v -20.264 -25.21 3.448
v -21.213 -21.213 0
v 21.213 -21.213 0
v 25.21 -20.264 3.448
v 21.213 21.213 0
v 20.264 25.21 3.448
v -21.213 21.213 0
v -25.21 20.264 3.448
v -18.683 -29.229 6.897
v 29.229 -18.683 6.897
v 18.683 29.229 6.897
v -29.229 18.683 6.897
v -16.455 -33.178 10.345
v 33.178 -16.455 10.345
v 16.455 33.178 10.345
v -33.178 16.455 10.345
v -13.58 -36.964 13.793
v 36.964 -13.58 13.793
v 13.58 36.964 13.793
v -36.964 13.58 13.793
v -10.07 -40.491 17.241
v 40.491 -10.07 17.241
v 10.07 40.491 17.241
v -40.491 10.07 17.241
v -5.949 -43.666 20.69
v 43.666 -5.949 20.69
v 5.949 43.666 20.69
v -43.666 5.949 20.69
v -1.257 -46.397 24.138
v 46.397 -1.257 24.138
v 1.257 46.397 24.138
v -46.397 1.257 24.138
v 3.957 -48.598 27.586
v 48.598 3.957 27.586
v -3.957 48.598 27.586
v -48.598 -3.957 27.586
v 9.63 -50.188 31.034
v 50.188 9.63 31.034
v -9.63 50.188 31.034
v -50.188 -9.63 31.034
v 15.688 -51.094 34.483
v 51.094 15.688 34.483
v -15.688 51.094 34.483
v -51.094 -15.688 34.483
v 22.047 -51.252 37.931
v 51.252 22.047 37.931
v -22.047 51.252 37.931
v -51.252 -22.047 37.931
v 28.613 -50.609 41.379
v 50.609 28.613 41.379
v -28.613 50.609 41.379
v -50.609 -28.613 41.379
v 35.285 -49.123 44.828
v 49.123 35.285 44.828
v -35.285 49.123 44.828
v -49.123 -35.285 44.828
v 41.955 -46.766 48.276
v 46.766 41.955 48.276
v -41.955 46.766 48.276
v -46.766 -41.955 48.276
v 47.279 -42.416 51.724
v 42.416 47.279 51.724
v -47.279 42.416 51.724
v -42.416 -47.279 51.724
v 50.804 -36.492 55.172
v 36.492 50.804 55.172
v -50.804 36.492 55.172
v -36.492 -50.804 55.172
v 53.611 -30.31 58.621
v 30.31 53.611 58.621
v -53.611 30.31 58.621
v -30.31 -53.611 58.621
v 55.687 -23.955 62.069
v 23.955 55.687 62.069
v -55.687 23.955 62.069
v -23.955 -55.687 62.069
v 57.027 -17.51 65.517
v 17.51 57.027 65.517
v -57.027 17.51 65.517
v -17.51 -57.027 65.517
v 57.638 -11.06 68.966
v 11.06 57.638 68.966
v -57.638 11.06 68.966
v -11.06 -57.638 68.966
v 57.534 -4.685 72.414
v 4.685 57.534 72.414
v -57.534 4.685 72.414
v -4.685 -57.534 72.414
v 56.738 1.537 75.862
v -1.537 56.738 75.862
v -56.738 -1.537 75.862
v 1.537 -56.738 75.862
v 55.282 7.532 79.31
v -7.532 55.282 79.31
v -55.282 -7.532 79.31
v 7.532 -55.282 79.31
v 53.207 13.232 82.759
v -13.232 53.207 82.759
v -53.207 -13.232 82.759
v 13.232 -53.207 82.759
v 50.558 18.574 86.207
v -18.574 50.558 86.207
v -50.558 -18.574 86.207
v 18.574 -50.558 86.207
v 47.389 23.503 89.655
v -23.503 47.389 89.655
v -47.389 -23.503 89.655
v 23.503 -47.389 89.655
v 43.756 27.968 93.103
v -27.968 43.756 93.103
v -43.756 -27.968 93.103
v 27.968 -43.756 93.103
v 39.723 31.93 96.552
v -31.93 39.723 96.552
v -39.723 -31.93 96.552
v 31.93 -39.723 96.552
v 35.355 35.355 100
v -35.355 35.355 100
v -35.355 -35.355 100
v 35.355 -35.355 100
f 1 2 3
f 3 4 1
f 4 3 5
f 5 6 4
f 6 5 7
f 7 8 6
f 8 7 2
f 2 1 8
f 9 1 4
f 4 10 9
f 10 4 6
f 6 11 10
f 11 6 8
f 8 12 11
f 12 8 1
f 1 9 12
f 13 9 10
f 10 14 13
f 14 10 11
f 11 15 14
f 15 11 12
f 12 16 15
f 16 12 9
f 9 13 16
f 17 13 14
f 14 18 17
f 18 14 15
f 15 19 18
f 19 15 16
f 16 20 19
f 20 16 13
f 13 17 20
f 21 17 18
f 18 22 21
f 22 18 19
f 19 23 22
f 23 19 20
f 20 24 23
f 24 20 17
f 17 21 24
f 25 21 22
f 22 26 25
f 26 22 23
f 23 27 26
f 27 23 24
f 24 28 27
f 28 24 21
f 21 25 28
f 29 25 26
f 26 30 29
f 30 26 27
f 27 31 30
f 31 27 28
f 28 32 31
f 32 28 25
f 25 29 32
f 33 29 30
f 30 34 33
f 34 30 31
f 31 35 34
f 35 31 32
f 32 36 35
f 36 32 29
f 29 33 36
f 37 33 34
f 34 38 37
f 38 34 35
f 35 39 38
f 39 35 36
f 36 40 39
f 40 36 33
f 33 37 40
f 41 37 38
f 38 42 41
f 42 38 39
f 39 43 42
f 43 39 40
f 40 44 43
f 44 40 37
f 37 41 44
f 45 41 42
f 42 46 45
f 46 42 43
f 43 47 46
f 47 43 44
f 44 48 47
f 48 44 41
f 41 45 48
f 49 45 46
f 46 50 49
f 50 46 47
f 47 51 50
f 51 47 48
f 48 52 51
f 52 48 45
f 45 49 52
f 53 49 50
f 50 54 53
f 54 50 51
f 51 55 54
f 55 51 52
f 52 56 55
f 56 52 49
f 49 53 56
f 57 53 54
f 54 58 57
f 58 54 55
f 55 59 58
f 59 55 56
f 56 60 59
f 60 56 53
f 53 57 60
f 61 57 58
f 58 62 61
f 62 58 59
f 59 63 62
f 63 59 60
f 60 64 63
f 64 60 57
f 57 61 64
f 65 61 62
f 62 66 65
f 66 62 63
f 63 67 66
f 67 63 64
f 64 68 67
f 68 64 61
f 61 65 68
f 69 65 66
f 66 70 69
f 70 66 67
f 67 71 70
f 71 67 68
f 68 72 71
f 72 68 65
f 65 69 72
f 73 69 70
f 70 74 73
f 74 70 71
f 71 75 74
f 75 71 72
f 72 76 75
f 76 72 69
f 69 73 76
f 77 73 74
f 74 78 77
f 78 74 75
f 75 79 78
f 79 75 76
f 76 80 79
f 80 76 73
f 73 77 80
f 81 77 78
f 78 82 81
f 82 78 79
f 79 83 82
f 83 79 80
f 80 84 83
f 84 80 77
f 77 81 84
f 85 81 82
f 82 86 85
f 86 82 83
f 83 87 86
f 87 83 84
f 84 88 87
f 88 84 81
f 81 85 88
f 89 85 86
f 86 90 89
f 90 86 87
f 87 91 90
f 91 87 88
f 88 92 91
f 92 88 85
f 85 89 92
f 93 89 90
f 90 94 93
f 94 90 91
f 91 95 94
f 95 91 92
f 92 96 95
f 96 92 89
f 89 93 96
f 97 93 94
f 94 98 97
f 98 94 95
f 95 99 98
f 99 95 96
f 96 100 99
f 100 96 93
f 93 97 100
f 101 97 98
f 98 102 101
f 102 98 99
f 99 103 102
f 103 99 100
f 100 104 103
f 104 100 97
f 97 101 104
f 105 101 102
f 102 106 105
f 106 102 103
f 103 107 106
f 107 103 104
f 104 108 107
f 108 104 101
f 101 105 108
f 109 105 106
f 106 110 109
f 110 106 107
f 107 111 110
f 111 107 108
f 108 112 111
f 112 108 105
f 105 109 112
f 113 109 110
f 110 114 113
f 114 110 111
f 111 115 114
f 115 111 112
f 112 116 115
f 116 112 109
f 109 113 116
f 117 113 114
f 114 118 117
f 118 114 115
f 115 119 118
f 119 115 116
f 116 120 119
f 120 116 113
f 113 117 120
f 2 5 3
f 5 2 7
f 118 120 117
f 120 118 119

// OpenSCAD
use <tubemesh.scad>

//<params>

// The vase profile will range from the left edge of the drawing square (=center of vase) to the right side of the drawing.
rightHandProfile = [ [ [-35,-25],[-18,0],[-25,25] ], [[0,1,2]] ]; // [draw_polygon:100x100]
crossSection = [ [ [-25,-25], [25,-25], [25,25], [-25,25] ], [[0,1,2,3]] ]; // [draw_polygon:100x100]
twistAngle = 180;
numberOfSections = 30;
actualHeight = 100;
forceDegreesOfRotationalSymmetry = 1;
mirrorInXAxis = 0; //[0:No,1:Yes]
//</params>

function findLowestY(path,pos=0,lowest=[-1,1e50]) =
    pos >= len(path) ? lowest :
    findLowestY(path,
        pos=pos+1,
        lowest=path[pos][1]<lowest[1] ? [pos,path[pos][1]] :       lowest);
        
// right-most curve from rightHandProfile
profile = [for (i=rightHandProfile[1][0]) rightHandProfile[0][i]];
np = len(profile);
lowest = findLowestY(profile);
lowestIndex = lowest[0];
lowestY = lowest[1];
highest = findLowestY(-profile);
highestIndex = highest[0];
highestY = -highest[1];

function angle(a,b) = let(ab=b-a) atan2(ab[1],ab[0]);

nextAngle = angle(profile[lowestIndex], profile[(lowestIndex+1+np)%np]);
prevAngle = angle(profile[lowestIndex], profile[(lowestIndex-1+np)%np]);
direction = nextAngle<prevAngle ? 1 : -1;

pointsInverted = direction > 0 ? 
    let(adjHighestIndex = lowestIndex <= highestIndex ? highestIndex : highestIndex+np) [for(i=[lowestIndex:adjHighestIndex]) [profile[i%np][1],50+profile[i%np][0]]] :
    let(adjLowestIndex = highestIndex <= lowestIndex ? lowestIndex : lowestIndex+np,
    n = lowestIndex-highestIndex)
    [for(i=[0:n]) let(ii=lowestIndex-i) [profile[ii%np][1],50+profile[ii%np][0]]];

function findSegment(f,x,soFar=0) =
    soFar >= len(f) ? len(f)-1 :
    x <= f[soFar][0] ? max(0,soFar-1) :
    findSegment(f,x,soFar=soFar+1);

function interpolateFunction(f,x) =
    let(i=findSegment(f,x))
    (f[i+1][1]-f[i][1])/(f[i+1][0]-f[i][0])*(x-f[i][0])+f[i][1];

renorm = 1/max([for(c=crossSection[0]) norm(c)]); 

module main(yMultiply=1) {
    for (crossIndices=crossSection[1]) {
        cross = [for(i=crossIndices) [crossSection[0][i][0],crossSection[0][i][1]*yMultiply]];
        sections = [for (i=[0:numberOfSections-1]) 
                let(t=i/(numberOfSections-1),
                    z=lowestY*(1-t)+highestY*t,
                    scale=renorm*interpolateFunction(pointsInverted,z))
                    twistSectionXY(sectionZ(scale*cross,z),t*twistAngle)];
        scale(actualHeight/(highestY-lowestY))
        translate([0,0,-lowestY])
        tubeMesh(sections);
    }               
}

for (i=[0:forceDegreesOfRotationalSymmetry-1])
    rotate([0,0,i*360/forceDegreesOfRotationalSymmetry]) {
        main();
        if (mirrorInXAxis) {
            main(yMultiply=-1);
        }
}
